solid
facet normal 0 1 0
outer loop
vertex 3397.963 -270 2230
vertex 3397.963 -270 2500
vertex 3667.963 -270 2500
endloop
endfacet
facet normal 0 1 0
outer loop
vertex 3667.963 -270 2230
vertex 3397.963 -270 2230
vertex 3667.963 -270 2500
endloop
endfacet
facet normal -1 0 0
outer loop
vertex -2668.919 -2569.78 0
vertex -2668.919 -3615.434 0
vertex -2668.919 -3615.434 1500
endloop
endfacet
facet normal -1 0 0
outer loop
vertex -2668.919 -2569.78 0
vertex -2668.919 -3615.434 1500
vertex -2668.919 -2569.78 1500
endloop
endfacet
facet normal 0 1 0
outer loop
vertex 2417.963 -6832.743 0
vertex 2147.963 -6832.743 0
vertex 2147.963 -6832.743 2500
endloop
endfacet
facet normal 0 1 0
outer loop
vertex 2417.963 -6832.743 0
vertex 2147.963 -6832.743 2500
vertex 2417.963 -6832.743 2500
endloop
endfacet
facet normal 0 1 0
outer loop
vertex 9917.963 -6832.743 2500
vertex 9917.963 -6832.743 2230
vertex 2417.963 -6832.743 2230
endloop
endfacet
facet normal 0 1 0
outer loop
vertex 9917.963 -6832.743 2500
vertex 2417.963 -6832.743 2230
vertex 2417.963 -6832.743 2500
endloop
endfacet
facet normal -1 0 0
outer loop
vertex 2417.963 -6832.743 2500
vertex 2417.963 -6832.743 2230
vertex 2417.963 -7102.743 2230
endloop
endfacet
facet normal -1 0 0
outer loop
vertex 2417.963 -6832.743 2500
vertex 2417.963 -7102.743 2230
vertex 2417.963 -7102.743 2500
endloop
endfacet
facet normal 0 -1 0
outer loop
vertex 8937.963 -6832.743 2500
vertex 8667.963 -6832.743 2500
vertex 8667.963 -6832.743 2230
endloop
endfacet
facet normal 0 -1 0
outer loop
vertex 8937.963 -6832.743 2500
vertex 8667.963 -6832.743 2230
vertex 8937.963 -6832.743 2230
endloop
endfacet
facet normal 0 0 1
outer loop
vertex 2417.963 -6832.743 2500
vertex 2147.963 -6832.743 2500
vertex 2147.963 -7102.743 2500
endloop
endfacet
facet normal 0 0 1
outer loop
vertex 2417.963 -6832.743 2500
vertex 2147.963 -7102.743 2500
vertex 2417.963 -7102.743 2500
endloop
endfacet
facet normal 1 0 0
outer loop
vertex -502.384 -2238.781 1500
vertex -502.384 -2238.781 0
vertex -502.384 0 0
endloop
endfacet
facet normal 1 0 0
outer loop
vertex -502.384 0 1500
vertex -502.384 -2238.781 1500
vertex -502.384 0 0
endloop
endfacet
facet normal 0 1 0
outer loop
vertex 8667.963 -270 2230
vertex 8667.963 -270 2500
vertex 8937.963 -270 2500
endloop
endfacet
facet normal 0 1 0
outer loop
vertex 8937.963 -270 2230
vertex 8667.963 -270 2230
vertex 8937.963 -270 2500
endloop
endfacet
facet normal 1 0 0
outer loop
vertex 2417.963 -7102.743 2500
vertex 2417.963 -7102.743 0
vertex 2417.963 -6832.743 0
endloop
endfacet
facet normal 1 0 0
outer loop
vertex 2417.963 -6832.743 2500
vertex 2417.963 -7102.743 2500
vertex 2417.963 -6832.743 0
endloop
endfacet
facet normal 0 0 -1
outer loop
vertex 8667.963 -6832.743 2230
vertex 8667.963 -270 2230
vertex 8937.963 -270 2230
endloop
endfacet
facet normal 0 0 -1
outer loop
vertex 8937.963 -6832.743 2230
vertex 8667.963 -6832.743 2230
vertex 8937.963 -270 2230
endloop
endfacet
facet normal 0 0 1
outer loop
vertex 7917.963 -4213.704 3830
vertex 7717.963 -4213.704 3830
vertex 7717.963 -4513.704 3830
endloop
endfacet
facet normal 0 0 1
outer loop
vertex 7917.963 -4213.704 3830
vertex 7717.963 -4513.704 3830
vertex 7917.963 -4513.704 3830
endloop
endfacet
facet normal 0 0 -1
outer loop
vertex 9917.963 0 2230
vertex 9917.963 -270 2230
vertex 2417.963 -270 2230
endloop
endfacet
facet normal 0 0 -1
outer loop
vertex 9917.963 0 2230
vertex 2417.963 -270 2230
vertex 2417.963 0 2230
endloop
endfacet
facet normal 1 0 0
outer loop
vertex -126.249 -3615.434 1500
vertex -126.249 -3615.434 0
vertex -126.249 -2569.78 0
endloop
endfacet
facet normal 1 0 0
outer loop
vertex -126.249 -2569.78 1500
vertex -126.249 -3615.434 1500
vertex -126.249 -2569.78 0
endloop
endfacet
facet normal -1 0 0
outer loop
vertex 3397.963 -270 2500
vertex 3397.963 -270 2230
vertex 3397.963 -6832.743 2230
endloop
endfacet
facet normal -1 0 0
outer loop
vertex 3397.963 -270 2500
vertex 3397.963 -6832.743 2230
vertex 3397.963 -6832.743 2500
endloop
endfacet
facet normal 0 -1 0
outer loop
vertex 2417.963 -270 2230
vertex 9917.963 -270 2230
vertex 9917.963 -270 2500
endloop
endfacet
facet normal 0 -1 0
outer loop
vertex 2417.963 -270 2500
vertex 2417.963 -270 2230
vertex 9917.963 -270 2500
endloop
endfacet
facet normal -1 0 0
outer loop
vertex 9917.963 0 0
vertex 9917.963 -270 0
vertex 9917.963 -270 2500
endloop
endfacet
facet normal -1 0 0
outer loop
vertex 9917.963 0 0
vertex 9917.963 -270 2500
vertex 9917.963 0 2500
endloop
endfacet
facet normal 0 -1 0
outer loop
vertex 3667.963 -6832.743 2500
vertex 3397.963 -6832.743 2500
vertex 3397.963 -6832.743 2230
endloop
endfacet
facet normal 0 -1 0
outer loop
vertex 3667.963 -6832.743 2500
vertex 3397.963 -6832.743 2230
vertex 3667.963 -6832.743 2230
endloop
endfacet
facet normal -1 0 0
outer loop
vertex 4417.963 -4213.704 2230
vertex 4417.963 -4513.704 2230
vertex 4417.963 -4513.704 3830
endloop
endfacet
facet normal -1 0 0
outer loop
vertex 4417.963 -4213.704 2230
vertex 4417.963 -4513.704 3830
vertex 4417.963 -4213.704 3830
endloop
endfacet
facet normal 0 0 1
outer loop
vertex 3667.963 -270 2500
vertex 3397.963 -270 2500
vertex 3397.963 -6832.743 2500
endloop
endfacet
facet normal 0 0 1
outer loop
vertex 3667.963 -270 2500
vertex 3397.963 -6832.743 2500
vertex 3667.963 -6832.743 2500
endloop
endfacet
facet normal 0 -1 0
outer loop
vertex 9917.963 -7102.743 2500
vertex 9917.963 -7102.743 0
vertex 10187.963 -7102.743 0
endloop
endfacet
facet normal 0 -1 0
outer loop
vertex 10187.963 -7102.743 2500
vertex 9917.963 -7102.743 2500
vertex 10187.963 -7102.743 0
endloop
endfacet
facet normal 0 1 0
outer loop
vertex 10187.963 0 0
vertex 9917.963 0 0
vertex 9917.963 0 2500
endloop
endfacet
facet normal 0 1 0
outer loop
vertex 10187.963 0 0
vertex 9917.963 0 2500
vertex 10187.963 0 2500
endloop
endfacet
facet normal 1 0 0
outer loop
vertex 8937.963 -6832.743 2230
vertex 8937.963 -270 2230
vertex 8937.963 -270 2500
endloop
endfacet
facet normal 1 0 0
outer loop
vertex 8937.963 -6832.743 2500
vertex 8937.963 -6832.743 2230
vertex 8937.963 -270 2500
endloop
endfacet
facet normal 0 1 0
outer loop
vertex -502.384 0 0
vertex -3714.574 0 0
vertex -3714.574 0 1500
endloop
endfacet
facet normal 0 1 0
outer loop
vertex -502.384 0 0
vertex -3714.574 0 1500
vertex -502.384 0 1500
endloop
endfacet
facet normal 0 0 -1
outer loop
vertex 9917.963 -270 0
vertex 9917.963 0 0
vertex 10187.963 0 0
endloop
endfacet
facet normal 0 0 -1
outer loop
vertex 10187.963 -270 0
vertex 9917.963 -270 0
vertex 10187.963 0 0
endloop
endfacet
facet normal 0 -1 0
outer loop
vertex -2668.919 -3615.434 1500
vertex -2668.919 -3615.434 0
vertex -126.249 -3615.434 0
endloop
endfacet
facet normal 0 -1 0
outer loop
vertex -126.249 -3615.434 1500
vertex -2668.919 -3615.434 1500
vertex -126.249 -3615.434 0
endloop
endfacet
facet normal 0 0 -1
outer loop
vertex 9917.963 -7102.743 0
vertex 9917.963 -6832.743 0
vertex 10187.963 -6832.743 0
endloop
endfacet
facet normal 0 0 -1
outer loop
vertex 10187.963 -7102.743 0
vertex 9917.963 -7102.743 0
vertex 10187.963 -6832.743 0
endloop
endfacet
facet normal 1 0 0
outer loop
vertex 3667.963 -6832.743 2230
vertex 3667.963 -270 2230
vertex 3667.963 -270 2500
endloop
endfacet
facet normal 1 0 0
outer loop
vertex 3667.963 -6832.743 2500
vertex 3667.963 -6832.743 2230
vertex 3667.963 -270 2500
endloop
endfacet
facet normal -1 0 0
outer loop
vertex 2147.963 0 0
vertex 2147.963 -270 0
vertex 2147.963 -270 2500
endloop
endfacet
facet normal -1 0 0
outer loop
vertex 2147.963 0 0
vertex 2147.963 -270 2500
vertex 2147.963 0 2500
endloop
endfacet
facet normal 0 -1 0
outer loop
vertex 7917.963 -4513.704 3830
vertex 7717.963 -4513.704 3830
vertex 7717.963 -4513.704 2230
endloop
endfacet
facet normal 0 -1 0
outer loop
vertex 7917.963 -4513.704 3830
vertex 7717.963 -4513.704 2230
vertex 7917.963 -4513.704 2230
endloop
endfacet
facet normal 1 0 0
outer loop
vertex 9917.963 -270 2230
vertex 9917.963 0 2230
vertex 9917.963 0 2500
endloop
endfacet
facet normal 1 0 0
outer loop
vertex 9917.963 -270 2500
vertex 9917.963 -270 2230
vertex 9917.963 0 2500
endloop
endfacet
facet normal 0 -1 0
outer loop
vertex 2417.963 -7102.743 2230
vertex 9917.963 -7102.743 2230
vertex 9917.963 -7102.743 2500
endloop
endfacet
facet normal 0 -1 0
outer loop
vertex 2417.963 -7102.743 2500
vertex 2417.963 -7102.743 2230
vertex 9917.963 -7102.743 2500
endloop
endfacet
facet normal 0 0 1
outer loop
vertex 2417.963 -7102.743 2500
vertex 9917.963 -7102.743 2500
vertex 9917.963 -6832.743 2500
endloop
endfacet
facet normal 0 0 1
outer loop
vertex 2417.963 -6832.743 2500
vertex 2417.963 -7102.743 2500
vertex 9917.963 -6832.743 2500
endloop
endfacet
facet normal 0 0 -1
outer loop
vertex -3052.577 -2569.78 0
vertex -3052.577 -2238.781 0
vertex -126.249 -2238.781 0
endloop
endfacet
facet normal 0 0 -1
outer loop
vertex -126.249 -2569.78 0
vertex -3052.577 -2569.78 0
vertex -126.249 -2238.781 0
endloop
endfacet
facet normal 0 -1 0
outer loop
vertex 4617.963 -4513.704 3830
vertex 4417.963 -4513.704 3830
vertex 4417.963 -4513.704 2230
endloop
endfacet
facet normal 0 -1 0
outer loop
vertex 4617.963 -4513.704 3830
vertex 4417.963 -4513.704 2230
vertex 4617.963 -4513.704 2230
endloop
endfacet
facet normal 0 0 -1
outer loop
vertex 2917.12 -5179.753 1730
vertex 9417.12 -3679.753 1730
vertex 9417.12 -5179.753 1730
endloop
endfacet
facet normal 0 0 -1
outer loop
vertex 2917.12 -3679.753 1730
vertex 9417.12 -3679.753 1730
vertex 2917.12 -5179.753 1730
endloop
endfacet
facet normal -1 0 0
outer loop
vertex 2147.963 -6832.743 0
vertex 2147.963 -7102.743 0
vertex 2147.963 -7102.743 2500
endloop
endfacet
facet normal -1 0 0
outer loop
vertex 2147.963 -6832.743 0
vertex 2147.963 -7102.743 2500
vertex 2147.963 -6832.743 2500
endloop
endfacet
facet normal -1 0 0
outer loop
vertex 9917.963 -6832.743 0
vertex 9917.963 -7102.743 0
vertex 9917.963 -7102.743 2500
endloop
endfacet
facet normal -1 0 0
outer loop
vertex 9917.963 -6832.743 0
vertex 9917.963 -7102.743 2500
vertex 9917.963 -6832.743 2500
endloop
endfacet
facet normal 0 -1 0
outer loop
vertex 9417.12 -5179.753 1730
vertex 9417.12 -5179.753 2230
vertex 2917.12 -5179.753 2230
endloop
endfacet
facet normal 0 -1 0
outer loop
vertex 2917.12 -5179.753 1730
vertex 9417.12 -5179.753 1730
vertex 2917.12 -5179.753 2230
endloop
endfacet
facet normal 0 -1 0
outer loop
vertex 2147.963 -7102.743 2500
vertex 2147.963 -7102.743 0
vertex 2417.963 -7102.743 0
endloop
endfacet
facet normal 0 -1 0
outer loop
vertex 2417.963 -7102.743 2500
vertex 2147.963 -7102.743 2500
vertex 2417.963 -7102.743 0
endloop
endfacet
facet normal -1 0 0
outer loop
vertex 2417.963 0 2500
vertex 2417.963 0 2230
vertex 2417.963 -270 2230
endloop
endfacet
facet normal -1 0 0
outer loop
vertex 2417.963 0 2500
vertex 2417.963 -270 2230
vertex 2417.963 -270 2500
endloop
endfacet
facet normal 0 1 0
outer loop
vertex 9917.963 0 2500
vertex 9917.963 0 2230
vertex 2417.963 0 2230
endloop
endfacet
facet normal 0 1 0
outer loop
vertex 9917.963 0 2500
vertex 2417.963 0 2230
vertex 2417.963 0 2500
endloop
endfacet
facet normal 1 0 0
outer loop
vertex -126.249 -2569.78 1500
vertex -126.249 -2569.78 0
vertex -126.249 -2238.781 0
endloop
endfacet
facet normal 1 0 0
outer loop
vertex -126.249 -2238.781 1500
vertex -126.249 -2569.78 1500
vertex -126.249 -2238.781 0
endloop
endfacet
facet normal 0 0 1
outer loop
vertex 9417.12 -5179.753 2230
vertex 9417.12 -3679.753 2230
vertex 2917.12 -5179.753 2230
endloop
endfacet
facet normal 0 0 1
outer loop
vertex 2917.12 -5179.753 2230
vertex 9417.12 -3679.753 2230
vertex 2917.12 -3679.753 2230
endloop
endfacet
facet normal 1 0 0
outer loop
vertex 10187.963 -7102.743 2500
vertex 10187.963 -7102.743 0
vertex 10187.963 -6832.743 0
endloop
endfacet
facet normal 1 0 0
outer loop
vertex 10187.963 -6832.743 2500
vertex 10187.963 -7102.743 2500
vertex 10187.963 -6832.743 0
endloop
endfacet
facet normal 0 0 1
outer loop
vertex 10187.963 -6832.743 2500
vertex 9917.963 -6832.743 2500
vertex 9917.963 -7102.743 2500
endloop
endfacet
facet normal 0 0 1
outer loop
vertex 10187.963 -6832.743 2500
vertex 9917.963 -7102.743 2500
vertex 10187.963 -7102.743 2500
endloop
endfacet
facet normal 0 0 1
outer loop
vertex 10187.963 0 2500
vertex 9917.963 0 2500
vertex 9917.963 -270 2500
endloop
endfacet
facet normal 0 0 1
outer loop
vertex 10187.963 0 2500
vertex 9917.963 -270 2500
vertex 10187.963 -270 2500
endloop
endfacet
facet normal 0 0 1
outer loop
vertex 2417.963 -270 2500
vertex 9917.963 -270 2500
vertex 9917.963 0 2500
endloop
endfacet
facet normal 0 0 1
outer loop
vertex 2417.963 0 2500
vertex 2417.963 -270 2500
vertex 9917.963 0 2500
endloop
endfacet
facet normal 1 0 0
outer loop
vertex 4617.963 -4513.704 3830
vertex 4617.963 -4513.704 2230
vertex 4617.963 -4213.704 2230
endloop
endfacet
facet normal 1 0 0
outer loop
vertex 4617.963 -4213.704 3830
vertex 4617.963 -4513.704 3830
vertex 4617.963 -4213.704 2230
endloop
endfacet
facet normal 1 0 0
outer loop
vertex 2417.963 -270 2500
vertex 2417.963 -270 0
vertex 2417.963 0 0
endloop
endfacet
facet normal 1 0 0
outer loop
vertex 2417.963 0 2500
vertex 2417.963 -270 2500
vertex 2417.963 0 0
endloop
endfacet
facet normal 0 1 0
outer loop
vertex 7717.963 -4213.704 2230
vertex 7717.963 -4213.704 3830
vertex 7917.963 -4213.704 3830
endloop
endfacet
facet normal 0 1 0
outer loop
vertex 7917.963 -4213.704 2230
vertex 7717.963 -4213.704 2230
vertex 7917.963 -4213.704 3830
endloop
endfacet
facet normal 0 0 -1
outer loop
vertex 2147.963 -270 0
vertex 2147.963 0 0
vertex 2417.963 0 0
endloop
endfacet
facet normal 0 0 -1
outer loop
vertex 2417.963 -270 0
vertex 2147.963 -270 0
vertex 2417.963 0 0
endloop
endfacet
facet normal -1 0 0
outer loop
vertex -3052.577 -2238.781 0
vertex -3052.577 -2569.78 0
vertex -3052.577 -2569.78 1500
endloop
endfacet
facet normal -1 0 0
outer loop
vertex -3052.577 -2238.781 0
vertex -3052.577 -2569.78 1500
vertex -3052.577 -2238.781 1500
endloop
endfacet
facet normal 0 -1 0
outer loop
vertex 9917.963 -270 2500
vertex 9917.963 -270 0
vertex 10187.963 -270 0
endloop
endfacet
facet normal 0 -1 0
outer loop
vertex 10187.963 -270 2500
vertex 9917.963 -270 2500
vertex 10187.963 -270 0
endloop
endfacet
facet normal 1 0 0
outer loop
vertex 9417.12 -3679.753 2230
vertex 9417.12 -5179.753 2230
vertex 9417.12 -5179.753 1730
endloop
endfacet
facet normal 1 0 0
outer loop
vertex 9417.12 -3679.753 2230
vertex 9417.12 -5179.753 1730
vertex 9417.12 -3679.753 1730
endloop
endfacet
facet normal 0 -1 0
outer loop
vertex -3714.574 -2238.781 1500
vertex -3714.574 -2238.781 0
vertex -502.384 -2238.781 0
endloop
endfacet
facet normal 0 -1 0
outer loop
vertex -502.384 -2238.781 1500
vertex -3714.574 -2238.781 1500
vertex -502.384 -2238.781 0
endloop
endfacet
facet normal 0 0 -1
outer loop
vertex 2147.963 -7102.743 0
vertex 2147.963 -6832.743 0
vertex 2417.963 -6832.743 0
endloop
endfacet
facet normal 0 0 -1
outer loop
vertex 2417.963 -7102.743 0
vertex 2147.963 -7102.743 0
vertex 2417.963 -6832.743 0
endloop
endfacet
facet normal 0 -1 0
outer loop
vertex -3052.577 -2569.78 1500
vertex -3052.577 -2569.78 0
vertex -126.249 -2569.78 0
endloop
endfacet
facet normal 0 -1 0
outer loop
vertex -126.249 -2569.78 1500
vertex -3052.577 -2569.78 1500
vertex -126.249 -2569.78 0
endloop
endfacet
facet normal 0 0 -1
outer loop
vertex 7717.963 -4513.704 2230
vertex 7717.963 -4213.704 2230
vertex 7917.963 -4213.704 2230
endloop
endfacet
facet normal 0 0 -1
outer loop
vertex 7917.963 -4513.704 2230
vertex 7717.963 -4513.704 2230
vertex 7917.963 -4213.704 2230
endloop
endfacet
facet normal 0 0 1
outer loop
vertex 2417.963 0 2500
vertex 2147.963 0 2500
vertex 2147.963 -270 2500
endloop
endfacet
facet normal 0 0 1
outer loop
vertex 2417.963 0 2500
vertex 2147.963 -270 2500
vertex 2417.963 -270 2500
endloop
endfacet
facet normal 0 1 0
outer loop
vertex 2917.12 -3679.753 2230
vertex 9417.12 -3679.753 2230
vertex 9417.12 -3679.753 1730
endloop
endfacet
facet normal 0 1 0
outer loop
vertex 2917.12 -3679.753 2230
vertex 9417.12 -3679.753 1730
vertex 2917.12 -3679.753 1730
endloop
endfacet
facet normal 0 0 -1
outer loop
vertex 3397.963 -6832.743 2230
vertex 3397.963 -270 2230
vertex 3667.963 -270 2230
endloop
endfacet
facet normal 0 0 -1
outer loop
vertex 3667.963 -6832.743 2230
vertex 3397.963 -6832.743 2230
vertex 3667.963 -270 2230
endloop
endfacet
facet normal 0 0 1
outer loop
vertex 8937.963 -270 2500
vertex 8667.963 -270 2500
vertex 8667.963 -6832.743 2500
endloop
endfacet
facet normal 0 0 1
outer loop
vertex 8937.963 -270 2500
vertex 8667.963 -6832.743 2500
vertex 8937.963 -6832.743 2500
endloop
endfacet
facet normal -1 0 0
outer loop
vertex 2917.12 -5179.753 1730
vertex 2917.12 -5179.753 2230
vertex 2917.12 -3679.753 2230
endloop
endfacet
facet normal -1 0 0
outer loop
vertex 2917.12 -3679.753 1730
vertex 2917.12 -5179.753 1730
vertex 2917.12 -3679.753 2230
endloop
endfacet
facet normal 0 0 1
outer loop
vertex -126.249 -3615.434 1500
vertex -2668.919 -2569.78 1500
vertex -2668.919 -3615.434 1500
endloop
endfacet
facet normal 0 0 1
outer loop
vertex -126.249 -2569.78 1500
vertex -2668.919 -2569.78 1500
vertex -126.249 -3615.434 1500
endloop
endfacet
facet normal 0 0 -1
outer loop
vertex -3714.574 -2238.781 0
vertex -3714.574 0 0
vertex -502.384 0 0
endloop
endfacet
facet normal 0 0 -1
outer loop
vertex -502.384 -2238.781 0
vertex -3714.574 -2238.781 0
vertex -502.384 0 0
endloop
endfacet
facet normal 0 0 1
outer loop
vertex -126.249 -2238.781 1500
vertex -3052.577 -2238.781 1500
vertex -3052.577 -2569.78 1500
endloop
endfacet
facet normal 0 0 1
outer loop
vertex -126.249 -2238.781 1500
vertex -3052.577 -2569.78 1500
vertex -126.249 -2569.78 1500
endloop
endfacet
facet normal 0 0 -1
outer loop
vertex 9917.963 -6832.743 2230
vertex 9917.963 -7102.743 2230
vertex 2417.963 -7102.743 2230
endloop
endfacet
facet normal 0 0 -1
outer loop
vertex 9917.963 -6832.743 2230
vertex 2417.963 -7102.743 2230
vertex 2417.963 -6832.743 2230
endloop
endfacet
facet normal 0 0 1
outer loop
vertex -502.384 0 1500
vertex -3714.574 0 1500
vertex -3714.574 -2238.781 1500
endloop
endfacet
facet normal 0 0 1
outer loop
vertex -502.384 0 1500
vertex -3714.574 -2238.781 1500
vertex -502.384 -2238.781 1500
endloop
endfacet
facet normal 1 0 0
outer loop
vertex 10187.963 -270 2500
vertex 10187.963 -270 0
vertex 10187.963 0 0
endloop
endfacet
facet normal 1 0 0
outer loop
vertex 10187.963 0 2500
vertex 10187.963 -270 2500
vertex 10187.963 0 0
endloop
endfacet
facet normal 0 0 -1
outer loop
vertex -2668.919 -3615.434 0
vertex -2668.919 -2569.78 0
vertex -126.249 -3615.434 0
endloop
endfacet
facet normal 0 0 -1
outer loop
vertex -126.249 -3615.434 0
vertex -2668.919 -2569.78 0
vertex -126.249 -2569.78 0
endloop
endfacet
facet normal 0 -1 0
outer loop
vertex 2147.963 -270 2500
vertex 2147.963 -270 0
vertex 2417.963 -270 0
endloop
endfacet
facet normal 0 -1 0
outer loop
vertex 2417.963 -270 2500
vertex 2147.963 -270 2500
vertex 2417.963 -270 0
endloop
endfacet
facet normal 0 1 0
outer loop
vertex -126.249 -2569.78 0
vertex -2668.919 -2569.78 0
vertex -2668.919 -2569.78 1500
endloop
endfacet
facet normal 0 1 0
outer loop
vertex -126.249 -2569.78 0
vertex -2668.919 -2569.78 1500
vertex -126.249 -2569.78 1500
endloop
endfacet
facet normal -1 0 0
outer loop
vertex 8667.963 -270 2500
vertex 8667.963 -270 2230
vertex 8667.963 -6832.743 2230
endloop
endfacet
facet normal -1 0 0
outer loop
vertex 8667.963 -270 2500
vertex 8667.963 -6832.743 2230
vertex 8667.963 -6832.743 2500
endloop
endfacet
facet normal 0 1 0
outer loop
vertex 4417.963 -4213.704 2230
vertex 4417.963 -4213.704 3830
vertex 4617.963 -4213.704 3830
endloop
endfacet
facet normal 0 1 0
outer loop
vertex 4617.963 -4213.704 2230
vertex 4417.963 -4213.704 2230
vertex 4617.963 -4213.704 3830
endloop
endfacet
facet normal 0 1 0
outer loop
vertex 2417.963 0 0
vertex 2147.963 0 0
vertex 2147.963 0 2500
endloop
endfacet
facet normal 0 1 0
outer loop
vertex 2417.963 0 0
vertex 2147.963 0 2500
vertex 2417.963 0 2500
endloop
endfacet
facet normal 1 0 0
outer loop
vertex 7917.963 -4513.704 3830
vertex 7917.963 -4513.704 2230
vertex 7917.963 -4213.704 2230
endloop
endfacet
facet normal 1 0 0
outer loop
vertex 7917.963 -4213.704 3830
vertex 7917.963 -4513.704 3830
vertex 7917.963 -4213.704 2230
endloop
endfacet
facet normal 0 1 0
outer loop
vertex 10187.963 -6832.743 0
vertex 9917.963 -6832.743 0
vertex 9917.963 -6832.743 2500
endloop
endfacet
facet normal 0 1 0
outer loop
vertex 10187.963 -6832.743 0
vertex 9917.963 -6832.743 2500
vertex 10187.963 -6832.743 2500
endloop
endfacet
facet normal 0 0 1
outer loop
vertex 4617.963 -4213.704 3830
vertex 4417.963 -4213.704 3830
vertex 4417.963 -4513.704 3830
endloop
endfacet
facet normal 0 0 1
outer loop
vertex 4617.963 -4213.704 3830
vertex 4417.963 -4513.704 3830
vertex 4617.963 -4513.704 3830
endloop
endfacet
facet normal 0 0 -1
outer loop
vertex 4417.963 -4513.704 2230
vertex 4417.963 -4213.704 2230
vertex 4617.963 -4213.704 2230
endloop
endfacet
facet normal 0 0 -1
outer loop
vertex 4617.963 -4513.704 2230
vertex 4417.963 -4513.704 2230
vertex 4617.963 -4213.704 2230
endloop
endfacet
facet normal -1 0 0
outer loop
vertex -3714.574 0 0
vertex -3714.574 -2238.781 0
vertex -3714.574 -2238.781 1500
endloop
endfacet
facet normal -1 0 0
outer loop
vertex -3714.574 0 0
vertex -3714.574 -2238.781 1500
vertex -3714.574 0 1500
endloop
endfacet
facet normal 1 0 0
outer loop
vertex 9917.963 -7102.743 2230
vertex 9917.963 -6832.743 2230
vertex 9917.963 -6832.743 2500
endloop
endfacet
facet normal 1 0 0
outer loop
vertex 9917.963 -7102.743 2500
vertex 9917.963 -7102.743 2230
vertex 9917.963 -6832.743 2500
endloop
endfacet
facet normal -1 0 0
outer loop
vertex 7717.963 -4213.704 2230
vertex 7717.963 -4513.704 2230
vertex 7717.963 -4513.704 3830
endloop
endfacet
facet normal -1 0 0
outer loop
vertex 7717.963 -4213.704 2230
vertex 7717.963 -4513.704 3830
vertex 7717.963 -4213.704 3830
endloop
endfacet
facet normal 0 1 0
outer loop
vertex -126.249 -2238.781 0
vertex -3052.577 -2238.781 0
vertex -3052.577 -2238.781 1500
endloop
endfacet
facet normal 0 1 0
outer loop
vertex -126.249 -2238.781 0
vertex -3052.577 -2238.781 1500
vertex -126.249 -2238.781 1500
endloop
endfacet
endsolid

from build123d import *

# Parameters (mm, degrees)
SKETCH12_W             = 2926.3276029
SKETCH12_H             = 330.99849492
BOSS_EXTRUDE11_DEPTH   = 1500
SKETCH13_W             = 2542.6702565
SKETCH13_H             = 1045.654336
BOSS_EXTRUDE12_DEPTH   = 1500
SKETCH11_W             = 3212.18994
SKETCH11_H             = 2238.781009538
BOSS_EXTRUDE13_DEPTH   = 1500
SKETCH17_W             = 270
SKETCH17_H             = 270
BOSS_EXTRUDE17_DEPTH   = 2500
BOSS_EXTRUDE17_2_DEPTH = 2500
BOSS_EXTRUDE17_3_DEPTH = 2500
BOSS_EXTRUDE17_4_DEPTH = 2500
SKETCH19_W             = 270
SKETCH19_H             = 270
BOSS_EXTRUDE19_DEPTH   = 7500
BOSS_EXTRUDE19_2_DEPTH = 7500
SKETCH20_W             = 270
SKETCH20_H             = 270
BOSS_EXTRUDE20_DEPTH   = 6562.743389
BOSS_EXTRUDE20_2_DEPTH = 6562.743389
SKETCH21_W             = 6500
SKETCH21_H             = 1500
BOSS_EXTRUDE21_DEPTH   = 500
SKETCH23_W             = 200
SKETCH23_H             = 300
BOSS_EXTRUDE22_DEPTH   = 1600
BOSS_EXTRUDE22_2_DEPTH = 1600


with BuildPart() as part:
    # Sketch12 → Boss-Extrude11 (new body)
    with BuildSketch(Plane.XY):
        with Locations((-1589.412881329, -2404.280256998)):
            Rectangle(SKETCH12_W, SKETCH12_H)
    extrude(amount=BOSS_EXTRUDE11_DEPTH)


with BuildPart() as body_2:
    # Sketch13 → Boss-Extrude12 (new body)
    with BuildSketch(Plane.XY):
        with Locations((-1397.584208129, -3092.606672458)):
            Rectangle(SKETCH13_W, SKETCH13_H)
    extrude(amount=BOSS_EXTRUDE12_DEPTH)


with BuildPart() as body_3:
    # Sketch11 → Boss-Extrude13 (new body)
    with BuildSketch(Plane.XY):
        with Locations((-2108.478702879, -1119.390504769)):
            Rectangle(SKETCH11_W, SKETCH11_H)
    extrude(amount=BOSS_EXTRUDE13_DEPTH)


with BuildPart() as body_4:
    # Sketch17 → Boss-Extrude17 (new body)
    with BuildSketch(Plane.XY):
        with Locations((2282.962662868, -135)):
            Rectangle(SKETCH17_W, SKETCH17_H)
    extrude(amount=BOSS_EXTRUDE17_DEPTH)


with BuildPart() as body_5:
    # Sketch17 → Boss-Extrude17 2 (new body)
    with BuildSketch(Plane.XY):
        with Locations((10052.962662868, -135)):
            Rectangle(SKETCH17_W, SKETCH17_H)
    extrude(amount=BOSS_EXTRUDE17_2_DEPTH)


with BuildPart() as body_6:
    # Sketch17 → Boss-Extrude17 3 (new body)
    with BuildSketch(Plane.XY):
        with Locations((2282.962662868, -6967.743389)):
            Rectangle(SKETCH17_W, SKETCH17_H)
    extrude(amount=BOSS_EXTRUDE17_3_DEPTH)


with BuildPart() as body_7:
    # Sketch17 → Boss-Extrude17 4 (new body)
    with BuildSketch(Plane.XY):
        with Locations((10052.962662868, -6967.743389)):
            Rectangle(SKETCH17_W, SKETCH17_H)
    extrude(amount=BOSS_EXTRUDE17_4_DEPTH)


with BuildPart() as body_8:
    # Sketch19 → Boss-Extrude19 (new body)
    with BuildSketch(Plane.ZY.offset(-9917.962662868)):
        with Locations((2365, -135)):
            Rectangle(SKETCH19_W, SKETCH19_H)
    extrude(amount=BOSS_EXTRUDE19_DEPTH)


with BuildPart() as body_9:
    # Sketch19 → Boss-Extrude19 2 (new body)
    with BuildSketch(Plane.ZY.offset(-9917.962662868)):
        with Locations((2365, -6967.743389)):
            Rectangle(SKETCH19_W, SKETCH19_H)
    extrude(amount=BOSS_EXTRUDE19_2_DEPTH)


with BuildPart() as body_10:
    # Sketch20 → Boss-Extrude20 (new body)
    with BuildSketch(Plane.XZ.offset(270)):
        with Locations((8802.962662868, 2365)):
            Rectangle(SKETCH20_W, SKETCH20_H)
    extrude(amount=BOSS_EXTRUDE20_DEPTH)


with BuildPart() as body_11:
    # Sketch20 → Boss-Extrude20 2 (new body)
    with BuildSketch(Plane.XZ.offset(270)):
        with Locations((3532.962662868, 2365)):
            Rectangle(SKETCH20_W, SKETCH20_H)
    extrude(amount=BOSS_EXTRUDE20_2_DEPTH)


with BuildPart() as body_12:
    # Sketch21 → Boss-Extrude21 (new body)
    with BuildSketch(Plane(origin=(0, 0, 2230), x_dir=(-1, 0, 0), z_dir=(0, 0, -1))):
        with Locations((-6167.119776447, -4429.7525618)):
            Rectangle(SKETCH21_W, SKETCH21_H)
    extrude(amount=BOSS_EXTRUDE21_DEPTH)


with BuildPart() as body_13:
    # Sketch23 → Boss-Extrude22 (new body)
    with BuildSketch(Plane.XY.offset(2230)):
        with Locations((4517.962662868, -4363.704249905)):
            Rectangle(SKETCH23_W, SKETCH23_H)
    extrude(amount=BOSS_EXTRUDE22_DEPTH)


with BuildPart() as body_14:
    # Sketch23 → Boss-Extrude22 2 (new body)
    with BuildSketch(Plane.XY.offset(2230)):
        with Locations((7817.962662868, -4363.704249905)):
            Rectangle(SKETCH23_W, SKETCH23_H)
    extrude(amount=BOSS_EXTRUDE22_2_DEPTH)


solid = Compound([part.part, body_2.part, body_3.part, body_4.part, body_5.part, body_6.part, body_7.part, body_8.part, body_9.part, body_10.part, body_11.part, body_12.part, body_13.part, body_14.part])
